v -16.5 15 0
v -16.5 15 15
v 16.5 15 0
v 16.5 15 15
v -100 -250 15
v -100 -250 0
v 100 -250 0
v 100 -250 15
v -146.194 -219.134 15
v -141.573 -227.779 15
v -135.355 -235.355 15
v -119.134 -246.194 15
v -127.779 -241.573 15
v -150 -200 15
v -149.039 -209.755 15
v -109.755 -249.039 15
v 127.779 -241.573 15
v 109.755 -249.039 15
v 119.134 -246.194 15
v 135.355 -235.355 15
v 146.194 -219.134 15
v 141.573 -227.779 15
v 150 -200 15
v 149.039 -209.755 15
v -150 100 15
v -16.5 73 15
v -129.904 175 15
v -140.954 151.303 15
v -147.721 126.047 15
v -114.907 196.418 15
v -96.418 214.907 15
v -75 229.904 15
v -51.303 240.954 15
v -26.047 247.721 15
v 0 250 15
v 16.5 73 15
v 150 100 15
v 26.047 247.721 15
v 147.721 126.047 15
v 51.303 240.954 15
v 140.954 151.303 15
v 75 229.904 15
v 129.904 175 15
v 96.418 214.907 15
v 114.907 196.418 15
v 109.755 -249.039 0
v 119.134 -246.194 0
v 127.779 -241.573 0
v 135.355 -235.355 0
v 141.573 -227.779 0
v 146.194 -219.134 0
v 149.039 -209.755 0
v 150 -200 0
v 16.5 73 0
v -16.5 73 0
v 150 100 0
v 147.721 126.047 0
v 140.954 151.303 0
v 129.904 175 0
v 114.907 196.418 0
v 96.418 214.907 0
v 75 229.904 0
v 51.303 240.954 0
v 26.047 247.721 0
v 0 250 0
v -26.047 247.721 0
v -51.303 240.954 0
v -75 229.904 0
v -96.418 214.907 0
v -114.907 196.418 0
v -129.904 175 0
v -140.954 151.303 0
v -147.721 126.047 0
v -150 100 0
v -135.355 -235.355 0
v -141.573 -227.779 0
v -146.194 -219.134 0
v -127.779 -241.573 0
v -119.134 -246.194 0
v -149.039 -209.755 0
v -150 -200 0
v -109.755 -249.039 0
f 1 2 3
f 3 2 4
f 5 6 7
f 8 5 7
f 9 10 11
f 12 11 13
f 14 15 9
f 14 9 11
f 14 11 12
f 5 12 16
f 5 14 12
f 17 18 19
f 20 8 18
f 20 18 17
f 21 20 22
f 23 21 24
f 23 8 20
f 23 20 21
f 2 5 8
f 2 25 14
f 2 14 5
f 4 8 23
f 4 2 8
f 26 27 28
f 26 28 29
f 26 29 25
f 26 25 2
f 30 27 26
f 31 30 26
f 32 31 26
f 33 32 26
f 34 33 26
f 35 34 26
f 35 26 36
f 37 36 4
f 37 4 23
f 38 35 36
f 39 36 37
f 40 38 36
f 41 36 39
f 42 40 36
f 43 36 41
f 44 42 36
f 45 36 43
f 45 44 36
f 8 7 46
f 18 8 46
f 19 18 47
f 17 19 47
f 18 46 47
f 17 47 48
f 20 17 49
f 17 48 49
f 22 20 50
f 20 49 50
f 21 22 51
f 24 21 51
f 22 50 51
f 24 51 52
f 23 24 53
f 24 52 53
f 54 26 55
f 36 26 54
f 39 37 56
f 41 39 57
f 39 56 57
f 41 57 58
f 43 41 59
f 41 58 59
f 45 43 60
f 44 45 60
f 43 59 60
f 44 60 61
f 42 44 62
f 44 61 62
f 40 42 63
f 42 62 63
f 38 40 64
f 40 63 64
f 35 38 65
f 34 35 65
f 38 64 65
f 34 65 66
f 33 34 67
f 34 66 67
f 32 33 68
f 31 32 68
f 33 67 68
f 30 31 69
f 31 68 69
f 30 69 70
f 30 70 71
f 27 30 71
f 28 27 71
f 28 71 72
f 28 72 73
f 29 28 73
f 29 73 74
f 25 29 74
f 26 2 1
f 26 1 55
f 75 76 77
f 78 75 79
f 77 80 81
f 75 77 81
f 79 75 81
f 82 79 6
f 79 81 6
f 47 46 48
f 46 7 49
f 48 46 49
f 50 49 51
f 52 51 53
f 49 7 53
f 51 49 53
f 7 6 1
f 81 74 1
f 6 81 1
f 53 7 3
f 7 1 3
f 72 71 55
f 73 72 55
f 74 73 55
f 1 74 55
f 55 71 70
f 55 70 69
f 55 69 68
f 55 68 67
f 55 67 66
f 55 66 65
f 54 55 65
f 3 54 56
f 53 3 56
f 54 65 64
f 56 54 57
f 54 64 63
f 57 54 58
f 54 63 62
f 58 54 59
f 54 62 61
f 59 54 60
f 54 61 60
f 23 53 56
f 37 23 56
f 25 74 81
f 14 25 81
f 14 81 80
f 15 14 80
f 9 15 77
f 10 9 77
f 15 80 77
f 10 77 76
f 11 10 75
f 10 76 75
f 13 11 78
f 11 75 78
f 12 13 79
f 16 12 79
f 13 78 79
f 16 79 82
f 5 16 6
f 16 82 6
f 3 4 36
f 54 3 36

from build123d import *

# Parameters (mm, degrees)
F1_DEPTH = 15
F2_W     = 33
F2_H     = 58
F3_DEPTH = 15.001


with BuildPart() as f1:
    # F0 (on Top) → F1 (new body)
    with BuildSketch(Plane.XY):
        with BuildLine():
            Line((-100, -250), (100, -250))
            ThreePointArc((100, -250), (135.355339, -235.355339), (150, -200))
            Line((150, -200), (150, 100))
            ThreePointArc((150, 100), (0, 250), (-150, 100))
            Line((-150, 100), (-150, -200))
            ThreePointArc((-150, -200), (-135.355339, -235.355339), (-100, -250))
        make_face()
    extrude(amount=F1_DEPTH)

    # F2 (on face) → F3 (cut, through all)
    with BuildSketch(Plane.XY.offset(15)):
        with Locations((0, 44)):
            Rectangle(F2_W, F2_H)
    extrude(amount=-F3_DEPTH, mode=Mode.SUBTRACT)


solid = f1.part
